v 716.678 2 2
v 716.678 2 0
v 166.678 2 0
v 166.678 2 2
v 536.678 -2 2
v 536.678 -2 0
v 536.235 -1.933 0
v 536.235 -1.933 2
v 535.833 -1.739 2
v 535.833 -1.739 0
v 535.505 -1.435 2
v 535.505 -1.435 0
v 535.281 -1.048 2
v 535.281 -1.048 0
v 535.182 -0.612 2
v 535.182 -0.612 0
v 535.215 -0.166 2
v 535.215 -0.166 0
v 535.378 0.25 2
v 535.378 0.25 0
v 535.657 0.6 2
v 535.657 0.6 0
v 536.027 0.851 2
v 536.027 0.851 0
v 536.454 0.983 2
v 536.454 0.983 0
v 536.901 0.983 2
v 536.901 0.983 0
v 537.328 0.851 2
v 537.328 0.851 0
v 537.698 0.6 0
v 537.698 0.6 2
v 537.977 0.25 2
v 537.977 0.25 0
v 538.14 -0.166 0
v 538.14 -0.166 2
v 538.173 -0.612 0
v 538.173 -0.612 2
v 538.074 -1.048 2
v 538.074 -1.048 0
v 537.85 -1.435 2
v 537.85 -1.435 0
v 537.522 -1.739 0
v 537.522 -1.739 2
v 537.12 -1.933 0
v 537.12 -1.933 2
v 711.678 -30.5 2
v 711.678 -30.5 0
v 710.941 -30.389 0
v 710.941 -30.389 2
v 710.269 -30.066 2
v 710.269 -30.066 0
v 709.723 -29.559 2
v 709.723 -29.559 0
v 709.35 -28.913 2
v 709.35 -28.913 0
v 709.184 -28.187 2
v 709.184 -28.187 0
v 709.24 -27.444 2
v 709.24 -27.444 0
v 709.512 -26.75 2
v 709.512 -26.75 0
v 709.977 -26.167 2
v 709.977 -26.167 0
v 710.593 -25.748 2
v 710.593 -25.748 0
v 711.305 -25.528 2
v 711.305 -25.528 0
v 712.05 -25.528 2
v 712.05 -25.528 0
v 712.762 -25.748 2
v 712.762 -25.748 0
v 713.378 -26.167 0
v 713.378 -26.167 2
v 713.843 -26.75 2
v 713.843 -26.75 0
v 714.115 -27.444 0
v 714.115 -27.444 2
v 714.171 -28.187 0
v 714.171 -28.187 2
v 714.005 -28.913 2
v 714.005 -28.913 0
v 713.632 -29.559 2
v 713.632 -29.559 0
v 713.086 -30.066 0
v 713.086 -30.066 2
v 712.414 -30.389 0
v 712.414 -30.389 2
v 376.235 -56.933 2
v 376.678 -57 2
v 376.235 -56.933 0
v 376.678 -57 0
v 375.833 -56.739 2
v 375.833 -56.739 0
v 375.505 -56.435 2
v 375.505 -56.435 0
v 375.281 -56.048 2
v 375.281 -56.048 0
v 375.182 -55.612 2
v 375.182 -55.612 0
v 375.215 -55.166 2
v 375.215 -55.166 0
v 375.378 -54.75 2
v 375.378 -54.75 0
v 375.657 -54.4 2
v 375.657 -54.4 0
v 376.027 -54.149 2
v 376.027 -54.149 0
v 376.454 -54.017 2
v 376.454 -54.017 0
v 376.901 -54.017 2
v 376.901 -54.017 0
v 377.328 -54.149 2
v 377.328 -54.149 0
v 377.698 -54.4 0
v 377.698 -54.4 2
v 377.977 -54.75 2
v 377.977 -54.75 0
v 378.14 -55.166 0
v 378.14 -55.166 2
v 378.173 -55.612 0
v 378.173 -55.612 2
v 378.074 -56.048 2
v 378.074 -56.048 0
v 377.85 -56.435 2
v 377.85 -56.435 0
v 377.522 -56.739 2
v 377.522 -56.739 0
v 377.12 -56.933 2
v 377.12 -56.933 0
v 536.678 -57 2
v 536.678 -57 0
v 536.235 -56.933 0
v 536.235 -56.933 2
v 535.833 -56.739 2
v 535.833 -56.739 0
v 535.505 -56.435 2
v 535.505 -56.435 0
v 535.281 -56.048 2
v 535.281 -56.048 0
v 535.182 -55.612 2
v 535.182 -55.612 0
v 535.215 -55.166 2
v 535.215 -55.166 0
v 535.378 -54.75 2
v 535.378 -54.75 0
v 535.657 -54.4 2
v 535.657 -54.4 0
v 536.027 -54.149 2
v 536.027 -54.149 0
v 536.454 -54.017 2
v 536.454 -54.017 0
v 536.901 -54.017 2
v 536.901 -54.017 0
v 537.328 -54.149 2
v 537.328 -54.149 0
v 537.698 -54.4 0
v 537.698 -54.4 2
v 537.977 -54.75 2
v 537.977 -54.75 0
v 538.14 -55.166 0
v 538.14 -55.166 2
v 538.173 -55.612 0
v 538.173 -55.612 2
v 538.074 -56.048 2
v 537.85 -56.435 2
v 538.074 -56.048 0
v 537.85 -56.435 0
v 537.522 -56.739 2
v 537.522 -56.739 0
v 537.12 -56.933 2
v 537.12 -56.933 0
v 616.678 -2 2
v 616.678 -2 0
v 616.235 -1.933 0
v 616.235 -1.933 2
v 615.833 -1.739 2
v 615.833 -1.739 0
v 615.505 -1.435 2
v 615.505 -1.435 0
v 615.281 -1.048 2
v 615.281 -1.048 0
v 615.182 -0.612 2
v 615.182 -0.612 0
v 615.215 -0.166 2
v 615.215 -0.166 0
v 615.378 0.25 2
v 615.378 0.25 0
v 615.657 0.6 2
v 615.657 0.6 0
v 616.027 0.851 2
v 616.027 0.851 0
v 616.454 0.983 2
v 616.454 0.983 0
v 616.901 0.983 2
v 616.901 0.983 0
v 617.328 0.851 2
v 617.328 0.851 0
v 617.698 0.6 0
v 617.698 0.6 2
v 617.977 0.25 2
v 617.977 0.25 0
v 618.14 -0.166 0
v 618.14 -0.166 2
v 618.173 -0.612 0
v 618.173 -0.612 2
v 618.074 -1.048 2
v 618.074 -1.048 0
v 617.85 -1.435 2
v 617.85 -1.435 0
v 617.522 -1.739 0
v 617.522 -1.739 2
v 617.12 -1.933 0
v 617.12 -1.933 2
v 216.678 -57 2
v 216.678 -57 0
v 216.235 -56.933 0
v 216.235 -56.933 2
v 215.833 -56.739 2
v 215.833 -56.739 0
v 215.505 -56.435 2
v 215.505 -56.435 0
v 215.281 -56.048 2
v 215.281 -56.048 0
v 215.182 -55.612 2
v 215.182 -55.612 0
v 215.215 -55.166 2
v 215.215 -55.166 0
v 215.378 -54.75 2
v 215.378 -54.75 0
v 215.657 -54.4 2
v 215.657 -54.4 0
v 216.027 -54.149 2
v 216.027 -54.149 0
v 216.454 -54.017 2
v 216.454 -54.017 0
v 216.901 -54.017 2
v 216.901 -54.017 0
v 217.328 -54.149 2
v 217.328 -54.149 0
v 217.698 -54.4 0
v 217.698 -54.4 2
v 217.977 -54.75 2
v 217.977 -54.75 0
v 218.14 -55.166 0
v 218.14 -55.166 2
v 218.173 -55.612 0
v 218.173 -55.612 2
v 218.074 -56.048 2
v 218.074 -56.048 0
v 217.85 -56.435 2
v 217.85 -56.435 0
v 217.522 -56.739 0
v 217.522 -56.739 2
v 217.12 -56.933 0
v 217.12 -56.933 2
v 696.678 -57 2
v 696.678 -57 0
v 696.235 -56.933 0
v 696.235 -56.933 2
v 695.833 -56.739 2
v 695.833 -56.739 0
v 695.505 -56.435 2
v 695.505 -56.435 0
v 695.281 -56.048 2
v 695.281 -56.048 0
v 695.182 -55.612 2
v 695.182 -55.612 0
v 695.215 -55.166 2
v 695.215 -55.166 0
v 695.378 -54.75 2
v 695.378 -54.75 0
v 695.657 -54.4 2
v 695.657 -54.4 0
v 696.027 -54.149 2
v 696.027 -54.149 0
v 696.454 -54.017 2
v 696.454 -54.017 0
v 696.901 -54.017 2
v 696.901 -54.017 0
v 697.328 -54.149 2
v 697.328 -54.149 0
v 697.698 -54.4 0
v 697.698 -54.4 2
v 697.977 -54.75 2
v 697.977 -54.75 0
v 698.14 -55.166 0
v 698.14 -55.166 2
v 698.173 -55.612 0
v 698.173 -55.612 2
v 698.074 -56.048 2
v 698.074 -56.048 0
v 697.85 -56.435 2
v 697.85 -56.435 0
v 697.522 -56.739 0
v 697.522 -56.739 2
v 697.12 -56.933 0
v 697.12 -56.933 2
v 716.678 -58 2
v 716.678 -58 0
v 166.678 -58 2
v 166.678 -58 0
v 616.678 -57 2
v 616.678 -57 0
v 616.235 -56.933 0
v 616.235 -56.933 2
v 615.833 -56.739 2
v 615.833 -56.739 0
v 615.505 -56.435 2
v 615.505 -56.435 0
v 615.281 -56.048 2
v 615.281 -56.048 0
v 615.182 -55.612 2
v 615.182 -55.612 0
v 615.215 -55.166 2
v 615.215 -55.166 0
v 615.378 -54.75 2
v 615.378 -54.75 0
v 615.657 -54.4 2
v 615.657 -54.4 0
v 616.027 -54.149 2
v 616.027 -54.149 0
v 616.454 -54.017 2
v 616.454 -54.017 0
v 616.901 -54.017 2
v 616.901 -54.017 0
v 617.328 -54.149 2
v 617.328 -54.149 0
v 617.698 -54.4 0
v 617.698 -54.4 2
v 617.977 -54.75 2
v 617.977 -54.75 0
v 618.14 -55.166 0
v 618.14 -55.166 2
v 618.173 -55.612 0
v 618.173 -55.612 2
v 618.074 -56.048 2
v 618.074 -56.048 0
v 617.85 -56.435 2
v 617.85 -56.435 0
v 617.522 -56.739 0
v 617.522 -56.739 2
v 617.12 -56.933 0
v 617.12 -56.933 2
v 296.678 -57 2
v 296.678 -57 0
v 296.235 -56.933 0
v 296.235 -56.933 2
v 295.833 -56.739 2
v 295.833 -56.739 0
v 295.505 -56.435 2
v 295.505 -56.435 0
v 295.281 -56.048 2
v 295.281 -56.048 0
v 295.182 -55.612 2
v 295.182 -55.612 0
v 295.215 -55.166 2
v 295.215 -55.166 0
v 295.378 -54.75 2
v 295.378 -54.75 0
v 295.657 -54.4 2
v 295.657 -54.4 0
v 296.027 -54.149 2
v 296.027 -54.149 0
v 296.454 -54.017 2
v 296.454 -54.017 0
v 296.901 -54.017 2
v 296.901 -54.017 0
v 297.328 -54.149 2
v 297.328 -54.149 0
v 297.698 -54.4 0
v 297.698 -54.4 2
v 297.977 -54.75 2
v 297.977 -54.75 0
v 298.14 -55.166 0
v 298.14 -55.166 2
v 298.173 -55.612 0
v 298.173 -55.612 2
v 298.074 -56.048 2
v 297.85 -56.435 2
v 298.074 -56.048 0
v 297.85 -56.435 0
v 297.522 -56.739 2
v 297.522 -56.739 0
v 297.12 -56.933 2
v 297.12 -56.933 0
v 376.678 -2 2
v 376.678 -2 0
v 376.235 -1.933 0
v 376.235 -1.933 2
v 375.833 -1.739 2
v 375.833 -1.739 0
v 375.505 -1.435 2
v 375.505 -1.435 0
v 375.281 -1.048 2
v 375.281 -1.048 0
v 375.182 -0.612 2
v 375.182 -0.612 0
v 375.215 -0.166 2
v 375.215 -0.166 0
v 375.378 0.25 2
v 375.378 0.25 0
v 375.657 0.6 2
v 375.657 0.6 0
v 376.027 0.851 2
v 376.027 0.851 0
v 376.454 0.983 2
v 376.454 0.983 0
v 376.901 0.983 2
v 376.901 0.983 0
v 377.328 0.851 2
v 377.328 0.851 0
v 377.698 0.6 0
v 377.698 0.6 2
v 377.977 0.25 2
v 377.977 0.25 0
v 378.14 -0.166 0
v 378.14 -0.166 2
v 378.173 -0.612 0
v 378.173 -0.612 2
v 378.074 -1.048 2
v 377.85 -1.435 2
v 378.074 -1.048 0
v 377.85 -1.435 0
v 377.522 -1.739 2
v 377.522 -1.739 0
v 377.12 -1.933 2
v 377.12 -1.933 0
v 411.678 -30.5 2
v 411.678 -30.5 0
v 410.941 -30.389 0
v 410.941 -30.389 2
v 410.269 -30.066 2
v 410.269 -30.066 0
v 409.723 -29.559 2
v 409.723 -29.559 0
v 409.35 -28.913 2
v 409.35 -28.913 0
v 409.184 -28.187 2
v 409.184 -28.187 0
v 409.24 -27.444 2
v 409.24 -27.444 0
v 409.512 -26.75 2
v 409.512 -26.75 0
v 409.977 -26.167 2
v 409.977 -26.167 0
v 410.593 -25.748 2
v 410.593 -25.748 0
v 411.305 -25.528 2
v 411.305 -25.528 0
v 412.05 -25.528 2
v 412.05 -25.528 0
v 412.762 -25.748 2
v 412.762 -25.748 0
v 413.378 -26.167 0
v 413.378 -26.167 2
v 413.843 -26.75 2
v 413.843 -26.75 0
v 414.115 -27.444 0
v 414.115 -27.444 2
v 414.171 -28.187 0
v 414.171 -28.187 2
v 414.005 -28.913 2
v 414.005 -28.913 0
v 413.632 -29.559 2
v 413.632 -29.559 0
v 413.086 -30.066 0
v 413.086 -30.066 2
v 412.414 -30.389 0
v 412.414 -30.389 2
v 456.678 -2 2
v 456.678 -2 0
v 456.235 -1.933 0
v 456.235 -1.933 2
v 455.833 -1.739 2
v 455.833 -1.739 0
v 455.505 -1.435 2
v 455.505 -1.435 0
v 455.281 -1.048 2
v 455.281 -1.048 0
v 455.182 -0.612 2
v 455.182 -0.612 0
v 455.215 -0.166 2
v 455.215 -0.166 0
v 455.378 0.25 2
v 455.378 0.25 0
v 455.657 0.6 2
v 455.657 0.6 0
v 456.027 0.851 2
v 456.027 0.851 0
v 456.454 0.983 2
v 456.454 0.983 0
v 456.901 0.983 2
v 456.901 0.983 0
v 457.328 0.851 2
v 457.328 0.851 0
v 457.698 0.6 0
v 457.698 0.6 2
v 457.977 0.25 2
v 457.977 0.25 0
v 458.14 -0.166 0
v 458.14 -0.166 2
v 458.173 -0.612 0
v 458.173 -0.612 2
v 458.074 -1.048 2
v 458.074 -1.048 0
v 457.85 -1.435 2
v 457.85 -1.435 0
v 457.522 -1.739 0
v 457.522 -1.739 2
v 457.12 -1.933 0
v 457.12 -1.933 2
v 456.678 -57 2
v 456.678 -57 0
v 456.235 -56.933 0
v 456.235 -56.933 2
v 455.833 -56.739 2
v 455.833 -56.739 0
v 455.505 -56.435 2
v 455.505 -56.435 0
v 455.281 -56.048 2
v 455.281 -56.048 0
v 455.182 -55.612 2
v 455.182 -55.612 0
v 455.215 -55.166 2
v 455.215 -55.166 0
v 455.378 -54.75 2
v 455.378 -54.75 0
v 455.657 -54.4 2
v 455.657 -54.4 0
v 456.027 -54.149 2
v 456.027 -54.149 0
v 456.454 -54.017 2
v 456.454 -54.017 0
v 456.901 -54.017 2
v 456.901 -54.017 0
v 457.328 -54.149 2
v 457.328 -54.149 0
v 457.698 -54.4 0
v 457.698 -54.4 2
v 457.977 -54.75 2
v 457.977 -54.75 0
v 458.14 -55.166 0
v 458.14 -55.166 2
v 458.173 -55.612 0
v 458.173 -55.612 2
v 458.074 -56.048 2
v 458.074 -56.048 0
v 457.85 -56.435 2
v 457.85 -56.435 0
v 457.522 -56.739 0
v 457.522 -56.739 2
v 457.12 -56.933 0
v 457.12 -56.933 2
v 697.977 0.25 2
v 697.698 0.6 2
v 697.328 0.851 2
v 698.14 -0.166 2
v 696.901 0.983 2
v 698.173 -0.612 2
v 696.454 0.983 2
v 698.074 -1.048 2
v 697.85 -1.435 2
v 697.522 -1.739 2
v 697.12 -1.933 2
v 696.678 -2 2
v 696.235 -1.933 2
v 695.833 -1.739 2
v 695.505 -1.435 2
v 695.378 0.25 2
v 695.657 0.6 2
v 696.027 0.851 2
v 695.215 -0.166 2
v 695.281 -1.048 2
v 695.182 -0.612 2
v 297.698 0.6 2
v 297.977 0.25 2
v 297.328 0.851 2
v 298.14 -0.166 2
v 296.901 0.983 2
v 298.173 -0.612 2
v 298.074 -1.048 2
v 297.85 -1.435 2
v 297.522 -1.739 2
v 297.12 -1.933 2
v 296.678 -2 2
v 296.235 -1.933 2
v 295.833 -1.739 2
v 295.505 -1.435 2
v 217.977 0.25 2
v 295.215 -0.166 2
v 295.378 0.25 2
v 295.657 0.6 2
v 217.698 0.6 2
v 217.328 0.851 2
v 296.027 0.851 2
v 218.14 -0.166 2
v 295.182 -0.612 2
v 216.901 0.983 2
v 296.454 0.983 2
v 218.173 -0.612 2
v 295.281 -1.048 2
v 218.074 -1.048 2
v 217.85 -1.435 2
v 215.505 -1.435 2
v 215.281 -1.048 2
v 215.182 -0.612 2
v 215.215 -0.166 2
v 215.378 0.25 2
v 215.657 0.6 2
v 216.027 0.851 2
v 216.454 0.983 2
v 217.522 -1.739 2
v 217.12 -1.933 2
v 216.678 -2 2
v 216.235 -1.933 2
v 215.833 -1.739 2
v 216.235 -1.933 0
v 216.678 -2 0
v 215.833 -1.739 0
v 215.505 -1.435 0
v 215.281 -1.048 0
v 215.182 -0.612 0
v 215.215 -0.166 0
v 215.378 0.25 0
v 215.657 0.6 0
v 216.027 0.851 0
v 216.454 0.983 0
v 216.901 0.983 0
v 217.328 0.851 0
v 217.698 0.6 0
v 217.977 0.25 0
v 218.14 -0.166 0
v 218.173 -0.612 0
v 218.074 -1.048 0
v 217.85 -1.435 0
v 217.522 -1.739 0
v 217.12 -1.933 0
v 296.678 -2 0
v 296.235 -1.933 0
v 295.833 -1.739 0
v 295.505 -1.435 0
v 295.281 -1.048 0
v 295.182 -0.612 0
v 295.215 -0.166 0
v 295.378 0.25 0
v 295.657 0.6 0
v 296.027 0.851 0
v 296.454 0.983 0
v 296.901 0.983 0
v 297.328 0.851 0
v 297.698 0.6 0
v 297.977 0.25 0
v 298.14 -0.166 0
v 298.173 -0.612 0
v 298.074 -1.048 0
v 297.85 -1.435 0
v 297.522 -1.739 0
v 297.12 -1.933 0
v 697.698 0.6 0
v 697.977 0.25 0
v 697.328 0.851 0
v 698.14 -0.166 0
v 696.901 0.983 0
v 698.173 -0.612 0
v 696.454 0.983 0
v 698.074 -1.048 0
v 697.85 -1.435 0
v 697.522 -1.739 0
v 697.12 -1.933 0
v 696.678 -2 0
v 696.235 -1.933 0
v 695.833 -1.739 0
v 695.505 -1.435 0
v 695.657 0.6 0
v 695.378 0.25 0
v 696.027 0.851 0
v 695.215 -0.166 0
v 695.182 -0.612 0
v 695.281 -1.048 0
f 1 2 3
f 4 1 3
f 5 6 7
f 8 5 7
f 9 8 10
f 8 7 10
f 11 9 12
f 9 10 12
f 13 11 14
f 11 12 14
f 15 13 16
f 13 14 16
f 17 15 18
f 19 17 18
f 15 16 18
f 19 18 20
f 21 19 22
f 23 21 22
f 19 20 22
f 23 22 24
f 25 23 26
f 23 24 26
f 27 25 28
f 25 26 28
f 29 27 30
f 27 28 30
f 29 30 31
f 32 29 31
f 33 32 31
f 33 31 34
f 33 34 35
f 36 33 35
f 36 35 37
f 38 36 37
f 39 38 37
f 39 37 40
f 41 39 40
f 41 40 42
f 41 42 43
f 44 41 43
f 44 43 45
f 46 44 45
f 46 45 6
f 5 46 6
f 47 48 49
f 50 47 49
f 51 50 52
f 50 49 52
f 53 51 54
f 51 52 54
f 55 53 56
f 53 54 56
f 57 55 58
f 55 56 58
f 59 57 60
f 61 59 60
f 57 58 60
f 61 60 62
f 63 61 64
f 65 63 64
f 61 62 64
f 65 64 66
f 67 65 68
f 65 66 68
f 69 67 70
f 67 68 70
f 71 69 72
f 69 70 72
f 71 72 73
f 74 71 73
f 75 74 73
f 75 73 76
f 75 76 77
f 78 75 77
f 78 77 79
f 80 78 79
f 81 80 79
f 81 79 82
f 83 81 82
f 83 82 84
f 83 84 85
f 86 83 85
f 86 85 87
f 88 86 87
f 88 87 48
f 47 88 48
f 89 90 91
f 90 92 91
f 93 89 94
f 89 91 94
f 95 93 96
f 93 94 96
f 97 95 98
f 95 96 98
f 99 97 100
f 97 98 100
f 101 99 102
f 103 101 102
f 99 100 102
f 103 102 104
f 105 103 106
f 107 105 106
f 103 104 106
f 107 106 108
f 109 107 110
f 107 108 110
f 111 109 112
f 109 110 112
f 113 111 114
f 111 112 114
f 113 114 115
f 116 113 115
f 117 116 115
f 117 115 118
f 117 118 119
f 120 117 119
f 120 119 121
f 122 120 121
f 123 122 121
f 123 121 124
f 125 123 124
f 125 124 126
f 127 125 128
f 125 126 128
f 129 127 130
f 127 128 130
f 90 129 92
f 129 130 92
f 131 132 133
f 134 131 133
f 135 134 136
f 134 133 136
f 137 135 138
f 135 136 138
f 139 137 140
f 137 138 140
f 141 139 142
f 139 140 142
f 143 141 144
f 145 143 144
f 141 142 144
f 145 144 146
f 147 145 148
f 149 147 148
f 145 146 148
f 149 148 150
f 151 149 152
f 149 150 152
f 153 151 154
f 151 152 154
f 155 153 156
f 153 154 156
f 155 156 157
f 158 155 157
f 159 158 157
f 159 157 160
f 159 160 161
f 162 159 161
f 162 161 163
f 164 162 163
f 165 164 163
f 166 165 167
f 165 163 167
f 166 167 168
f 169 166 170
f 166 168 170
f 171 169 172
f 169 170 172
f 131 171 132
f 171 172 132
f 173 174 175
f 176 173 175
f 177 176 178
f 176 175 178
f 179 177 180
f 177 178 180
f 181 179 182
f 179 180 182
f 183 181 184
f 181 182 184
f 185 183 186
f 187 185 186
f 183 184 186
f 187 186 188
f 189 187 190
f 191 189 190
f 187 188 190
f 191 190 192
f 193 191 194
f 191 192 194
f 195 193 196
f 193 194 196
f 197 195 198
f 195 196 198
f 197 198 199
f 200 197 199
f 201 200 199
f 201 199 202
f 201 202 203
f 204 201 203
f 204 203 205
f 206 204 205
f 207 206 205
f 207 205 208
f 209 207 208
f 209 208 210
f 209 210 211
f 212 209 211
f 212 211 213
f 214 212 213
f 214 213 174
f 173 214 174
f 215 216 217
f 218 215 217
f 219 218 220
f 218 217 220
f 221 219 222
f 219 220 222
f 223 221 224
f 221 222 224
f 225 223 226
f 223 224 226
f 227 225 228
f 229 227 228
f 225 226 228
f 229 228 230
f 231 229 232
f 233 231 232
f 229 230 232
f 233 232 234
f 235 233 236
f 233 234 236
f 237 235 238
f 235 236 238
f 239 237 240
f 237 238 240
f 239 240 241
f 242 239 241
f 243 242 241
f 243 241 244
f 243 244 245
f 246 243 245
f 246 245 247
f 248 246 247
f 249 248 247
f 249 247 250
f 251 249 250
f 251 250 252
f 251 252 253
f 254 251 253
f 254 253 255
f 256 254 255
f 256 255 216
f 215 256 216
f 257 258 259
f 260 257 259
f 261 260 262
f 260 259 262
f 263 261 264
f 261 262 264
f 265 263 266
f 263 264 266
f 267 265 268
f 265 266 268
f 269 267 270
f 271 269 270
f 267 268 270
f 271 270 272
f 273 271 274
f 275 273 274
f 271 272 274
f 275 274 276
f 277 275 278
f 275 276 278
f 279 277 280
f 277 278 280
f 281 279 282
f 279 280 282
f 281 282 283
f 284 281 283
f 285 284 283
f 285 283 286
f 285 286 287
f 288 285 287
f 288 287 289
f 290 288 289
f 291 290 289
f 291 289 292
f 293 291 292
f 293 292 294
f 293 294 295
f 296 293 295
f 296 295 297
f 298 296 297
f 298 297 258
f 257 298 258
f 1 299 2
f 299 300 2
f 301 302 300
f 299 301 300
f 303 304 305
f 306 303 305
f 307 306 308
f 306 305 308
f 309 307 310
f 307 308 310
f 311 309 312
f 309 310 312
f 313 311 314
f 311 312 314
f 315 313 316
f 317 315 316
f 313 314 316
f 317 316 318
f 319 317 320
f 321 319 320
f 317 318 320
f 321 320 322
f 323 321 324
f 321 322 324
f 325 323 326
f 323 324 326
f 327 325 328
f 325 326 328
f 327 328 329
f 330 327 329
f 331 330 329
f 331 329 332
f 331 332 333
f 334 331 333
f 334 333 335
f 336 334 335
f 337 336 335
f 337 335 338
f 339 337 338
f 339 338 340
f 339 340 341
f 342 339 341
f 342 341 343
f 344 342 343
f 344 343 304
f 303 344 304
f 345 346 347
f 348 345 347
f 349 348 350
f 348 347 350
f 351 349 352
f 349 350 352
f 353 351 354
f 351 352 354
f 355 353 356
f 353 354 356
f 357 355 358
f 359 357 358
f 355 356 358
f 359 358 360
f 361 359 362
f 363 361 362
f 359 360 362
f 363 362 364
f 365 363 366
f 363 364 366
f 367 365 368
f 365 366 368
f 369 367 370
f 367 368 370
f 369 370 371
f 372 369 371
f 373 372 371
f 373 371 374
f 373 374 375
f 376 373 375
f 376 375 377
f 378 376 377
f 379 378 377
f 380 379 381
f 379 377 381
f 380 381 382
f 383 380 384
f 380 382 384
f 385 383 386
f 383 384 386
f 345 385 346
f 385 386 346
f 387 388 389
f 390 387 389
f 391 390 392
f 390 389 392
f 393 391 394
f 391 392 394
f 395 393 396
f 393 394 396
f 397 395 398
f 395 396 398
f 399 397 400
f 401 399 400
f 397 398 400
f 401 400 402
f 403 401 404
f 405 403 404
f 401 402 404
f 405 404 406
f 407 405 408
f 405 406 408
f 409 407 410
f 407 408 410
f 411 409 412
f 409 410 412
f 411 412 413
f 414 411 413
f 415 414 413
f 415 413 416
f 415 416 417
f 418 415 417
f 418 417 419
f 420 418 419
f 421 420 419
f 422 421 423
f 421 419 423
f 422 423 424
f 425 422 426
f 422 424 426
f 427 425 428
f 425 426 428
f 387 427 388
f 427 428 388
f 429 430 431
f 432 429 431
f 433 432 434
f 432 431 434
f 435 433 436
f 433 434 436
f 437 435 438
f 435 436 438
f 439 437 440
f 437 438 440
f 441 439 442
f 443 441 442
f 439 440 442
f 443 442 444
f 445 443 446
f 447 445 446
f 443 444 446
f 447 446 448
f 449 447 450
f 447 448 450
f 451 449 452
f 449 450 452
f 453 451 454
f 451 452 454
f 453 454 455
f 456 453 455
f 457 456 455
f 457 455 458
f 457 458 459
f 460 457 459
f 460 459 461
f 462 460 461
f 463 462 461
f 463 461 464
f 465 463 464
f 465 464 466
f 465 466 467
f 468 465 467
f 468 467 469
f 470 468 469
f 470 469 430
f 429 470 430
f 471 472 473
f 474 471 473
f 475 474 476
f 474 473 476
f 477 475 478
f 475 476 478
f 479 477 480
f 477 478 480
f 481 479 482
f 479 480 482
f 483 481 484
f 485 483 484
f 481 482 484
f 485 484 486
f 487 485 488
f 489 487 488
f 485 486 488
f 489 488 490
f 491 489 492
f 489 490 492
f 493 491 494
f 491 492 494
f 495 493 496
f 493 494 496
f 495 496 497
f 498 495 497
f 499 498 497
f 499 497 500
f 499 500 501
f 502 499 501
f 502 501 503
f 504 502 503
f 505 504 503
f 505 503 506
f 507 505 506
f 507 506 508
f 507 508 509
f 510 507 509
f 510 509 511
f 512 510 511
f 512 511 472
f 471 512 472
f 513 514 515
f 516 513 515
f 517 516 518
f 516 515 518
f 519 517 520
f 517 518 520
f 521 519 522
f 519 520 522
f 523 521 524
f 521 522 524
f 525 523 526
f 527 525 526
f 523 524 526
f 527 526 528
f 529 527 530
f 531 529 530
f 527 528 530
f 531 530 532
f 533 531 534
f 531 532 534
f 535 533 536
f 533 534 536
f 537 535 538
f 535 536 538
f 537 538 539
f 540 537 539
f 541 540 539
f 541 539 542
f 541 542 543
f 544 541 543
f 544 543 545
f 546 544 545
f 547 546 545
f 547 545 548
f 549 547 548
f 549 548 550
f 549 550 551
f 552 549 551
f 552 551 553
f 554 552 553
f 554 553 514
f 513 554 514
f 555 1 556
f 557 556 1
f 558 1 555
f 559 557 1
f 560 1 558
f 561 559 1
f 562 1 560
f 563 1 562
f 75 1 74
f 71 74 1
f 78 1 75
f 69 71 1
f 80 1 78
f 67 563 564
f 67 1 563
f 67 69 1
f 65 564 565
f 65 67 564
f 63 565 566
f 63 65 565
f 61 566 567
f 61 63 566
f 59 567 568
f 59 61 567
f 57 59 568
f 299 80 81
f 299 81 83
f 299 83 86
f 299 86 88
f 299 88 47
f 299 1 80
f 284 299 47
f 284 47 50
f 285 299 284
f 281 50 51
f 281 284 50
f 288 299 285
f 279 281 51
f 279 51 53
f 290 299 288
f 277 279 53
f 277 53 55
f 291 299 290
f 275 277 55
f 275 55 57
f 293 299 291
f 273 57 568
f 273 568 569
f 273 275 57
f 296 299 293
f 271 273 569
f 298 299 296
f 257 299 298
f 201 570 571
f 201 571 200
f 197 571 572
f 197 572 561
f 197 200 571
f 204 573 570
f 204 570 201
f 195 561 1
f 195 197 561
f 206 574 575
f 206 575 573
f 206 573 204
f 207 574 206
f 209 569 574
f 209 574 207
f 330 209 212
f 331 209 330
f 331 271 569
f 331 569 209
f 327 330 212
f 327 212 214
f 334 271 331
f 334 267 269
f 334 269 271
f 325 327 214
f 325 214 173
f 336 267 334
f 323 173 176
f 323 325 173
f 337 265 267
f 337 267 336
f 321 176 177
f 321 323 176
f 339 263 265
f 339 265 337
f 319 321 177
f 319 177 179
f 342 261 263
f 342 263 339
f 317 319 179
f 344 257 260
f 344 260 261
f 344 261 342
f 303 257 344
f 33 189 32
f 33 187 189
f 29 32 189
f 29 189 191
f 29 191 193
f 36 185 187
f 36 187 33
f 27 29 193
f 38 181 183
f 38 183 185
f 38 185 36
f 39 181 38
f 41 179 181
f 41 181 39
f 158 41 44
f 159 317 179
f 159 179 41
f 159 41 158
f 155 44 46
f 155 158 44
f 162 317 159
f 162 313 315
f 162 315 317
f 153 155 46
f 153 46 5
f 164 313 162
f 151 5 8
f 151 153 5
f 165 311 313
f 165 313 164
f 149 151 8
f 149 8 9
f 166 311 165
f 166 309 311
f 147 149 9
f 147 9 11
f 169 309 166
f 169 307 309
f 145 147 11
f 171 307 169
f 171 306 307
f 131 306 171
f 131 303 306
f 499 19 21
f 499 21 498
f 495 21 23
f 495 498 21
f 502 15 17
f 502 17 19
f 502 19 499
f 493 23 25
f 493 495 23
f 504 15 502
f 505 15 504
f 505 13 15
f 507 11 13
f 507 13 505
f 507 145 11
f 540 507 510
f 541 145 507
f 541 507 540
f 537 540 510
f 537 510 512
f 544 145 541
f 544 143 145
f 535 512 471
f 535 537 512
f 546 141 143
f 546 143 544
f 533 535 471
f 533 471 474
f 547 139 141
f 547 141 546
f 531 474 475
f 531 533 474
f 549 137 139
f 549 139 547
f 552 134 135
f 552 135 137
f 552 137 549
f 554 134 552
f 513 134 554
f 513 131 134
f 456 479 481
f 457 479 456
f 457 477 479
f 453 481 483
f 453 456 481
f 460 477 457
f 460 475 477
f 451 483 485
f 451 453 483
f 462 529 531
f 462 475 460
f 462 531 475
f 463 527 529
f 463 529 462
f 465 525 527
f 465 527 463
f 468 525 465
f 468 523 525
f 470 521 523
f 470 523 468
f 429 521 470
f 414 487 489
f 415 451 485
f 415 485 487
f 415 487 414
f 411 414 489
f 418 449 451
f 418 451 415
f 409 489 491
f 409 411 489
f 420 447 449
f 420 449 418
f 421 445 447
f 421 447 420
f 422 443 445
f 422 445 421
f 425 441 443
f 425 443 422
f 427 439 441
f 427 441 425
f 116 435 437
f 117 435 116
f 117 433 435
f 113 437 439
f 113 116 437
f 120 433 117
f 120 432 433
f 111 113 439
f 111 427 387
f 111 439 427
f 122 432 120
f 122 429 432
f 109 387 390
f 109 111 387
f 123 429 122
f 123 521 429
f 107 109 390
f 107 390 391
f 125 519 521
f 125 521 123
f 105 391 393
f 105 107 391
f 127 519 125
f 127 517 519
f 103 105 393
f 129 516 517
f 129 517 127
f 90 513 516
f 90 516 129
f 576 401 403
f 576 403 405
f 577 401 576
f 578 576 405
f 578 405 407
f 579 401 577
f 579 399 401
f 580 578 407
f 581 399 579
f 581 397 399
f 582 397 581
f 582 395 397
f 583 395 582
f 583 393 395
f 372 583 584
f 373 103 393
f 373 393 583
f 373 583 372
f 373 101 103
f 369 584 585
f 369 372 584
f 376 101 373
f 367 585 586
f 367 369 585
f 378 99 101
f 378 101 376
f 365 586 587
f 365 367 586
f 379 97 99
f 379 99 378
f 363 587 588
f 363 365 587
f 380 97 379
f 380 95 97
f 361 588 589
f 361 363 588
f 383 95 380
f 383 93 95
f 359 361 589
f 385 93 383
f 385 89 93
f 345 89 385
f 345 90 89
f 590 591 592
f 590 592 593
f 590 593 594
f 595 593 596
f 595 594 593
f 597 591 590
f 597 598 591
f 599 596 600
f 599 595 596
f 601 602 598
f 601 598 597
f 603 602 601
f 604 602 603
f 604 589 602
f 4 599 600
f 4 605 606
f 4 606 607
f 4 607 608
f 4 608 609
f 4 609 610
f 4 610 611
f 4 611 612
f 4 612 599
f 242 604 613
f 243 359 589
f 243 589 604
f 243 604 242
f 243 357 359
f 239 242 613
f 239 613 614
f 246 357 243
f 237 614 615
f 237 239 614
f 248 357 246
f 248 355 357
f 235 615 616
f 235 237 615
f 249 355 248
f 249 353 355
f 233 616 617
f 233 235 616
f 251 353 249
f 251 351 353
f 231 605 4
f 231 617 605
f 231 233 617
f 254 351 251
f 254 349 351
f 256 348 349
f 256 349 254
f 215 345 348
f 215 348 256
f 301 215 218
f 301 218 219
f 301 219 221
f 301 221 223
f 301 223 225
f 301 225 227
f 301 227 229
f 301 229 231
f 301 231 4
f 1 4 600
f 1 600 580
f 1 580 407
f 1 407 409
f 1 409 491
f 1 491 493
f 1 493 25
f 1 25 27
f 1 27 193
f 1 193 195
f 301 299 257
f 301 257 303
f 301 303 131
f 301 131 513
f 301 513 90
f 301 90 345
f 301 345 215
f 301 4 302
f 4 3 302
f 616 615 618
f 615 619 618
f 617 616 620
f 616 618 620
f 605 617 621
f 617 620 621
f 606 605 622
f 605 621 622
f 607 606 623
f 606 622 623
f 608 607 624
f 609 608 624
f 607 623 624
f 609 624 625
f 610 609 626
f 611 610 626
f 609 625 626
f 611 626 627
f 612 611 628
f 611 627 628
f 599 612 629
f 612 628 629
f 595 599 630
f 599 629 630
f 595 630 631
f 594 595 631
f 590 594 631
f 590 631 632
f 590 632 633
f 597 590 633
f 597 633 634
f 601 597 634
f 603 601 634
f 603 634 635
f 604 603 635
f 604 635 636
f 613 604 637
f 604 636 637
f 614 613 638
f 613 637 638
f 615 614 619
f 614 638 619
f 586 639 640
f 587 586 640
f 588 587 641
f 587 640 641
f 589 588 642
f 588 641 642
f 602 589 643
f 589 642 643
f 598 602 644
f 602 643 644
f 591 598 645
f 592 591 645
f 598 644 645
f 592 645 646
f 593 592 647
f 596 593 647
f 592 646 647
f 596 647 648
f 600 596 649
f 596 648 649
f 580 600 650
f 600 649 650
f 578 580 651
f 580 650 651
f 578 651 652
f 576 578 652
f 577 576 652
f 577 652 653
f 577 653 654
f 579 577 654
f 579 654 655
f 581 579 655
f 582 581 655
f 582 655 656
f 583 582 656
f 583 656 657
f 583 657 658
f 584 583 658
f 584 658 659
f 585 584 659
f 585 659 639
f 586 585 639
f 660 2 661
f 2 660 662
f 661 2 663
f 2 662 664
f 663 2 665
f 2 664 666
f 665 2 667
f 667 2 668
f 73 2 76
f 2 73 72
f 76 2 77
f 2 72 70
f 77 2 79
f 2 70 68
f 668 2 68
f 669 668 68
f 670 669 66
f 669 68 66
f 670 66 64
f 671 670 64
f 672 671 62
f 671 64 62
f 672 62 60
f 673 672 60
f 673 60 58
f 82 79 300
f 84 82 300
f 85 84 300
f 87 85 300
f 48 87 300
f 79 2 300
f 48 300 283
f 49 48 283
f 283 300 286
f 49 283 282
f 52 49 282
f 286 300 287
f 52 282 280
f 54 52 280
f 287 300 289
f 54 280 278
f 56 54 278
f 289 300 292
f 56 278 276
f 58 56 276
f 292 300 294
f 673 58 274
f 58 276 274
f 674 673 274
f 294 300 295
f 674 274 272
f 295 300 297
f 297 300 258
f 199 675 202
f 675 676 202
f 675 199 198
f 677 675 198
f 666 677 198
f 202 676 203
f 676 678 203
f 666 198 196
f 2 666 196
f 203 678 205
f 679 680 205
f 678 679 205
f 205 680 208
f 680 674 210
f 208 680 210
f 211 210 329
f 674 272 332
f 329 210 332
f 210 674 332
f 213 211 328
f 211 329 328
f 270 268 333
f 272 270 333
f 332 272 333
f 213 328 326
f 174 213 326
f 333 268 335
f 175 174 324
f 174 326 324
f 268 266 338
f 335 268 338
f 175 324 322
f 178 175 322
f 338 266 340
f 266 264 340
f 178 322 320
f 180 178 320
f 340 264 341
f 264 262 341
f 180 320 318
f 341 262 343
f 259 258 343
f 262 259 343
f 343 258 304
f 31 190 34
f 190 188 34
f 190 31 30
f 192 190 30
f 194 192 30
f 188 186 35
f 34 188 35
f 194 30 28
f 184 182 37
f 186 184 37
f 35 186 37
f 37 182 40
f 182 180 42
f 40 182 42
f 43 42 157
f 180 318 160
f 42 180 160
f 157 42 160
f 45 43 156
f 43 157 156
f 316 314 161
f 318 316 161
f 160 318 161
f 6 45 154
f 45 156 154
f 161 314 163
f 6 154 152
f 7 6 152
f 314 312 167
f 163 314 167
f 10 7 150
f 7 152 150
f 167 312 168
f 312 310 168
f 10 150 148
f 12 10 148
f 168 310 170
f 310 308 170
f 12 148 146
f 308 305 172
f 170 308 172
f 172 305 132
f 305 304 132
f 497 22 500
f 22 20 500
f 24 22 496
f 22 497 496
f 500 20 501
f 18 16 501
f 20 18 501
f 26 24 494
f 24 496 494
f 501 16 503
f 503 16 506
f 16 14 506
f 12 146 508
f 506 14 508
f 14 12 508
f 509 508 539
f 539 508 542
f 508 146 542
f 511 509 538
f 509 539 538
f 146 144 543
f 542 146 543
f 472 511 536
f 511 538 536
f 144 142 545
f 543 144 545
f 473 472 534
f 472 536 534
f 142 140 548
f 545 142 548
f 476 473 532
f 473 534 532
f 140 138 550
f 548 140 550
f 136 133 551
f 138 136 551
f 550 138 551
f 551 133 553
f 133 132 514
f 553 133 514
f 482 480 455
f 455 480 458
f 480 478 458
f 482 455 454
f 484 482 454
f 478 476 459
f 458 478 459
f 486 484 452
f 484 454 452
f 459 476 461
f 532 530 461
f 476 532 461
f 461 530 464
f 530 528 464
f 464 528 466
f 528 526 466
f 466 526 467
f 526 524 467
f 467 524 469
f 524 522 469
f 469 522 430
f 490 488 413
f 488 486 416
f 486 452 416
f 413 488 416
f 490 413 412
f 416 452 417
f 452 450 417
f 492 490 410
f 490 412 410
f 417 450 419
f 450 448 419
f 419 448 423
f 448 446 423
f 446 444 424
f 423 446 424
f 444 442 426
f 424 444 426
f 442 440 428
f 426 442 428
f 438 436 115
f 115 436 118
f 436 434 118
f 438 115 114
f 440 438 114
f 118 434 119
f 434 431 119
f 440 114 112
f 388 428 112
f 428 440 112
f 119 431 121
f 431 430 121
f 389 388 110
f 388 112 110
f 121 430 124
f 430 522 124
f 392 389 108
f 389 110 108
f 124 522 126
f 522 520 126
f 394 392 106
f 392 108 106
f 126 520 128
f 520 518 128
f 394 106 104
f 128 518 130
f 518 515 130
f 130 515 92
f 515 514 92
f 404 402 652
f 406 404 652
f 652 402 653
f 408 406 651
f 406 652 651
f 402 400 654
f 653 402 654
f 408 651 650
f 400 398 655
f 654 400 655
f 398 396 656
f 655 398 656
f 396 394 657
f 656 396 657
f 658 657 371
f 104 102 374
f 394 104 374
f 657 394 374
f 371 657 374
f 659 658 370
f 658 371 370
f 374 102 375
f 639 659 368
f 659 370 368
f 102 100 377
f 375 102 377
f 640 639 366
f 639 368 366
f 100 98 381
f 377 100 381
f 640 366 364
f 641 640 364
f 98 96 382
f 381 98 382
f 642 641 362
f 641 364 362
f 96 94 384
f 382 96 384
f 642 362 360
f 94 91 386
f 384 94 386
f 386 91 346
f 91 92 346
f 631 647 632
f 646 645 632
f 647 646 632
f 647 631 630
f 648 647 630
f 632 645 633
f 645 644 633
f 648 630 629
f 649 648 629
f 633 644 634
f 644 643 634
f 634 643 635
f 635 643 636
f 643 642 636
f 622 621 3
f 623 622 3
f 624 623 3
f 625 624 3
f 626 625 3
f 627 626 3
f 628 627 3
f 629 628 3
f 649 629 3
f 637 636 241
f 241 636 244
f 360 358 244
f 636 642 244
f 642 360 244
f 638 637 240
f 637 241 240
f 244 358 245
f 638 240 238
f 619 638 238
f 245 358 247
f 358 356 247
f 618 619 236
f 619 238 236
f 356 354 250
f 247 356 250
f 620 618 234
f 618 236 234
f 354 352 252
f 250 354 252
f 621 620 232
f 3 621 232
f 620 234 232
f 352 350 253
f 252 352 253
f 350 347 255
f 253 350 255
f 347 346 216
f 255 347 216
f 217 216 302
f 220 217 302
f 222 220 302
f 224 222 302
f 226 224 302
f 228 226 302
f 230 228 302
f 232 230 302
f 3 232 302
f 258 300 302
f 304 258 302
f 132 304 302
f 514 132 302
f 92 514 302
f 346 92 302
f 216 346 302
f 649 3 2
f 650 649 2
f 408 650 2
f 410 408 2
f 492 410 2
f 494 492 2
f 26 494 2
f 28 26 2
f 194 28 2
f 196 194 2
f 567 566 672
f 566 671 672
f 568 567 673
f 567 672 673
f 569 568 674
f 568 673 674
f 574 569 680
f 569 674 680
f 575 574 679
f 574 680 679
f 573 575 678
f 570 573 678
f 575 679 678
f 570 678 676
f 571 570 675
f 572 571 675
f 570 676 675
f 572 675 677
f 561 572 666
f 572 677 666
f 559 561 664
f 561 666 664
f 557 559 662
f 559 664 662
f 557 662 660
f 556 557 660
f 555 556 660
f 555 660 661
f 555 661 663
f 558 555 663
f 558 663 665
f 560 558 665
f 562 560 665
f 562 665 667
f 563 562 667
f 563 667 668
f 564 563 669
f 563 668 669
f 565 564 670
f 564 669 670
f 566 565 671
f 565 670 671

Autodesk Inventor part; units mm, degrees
ref_plane "YZ Plane" through (0, 0, 0) normal (1, 0, 0) x (0, 1, 0)
ref_plane "XZ Plane" through (0, 0, 0) normal (0, 1, 0) x (-1, 0, 0)
ref_plane "XY Plane" through (0, 0, 0) normal (0, 0, 1) x (1, 0, 0)
ref_plane "Work Plane3" through (759.785, -2, 0) normal (0, 0, 1) x (-1, 0, 0)
sketch "Sketch2" plane through (759.785, -2, 0) normal (0, 0, 1) x (-1, 0, 0)
  line L0 (43.1075, -4) -> (593.1075, -4)
  line L1 (593.1075, -4) -> (593.1075, 56)
  line L2 (593.1075, 56) -> (43.1075, 56)
  line L3 (43.1075, 56) -> (43.1075, -4)
  point P0 (759.785, -2)
  dimension "d0" = 550
  dimension "d1" = 60
extrude "Extrusion1" add sketch "Sketch2" along normal blind 2
sketch "Sketch4" plane through (759.785, -2, 2) normal (0, 0, 1) x (1, 0, 0)
  line L0 (-43.1075, 4) -> (-593.1075, 4) projected
  line L1 (-43.1075, -56) -> (-43.1075, 4) projected
  point P0 (-759.785, 2)
  point P1 (-48.1075, -26)
  point P2 (-348.1075, -26)
  point P3 (-648.1075, -26)
  dimension "d14" = 30
  dimension "d15" = 5
  dimension "d18" = 300
hole "Hole2" at (111.6775, -28, 2) at (411.6775, -28, 2) at (711.6775, -28, 2) direction (0, 0, -1) diameter 5 end through all
chamfer "Chamfer1" [suppressed]
sketch "Sketch5" plane through (759.785, -2, 2) normal (0, 0, 1) x (1, 0, 0)
  line L0 (-43.1075, 4) -> (-593.1075, 4) projected
  line L1 (-43.1075, -56) -> (-43.1075, 4) projected
  point P0 (-63.1075, 1.5)
  point P1 (-143.1075, 1.5)
  point P2 (-223.1075, 1.5)
  point P3 (-303.1075, 1.5)
  point P4 (-383.1075, 1.5)
  point P5 (-463.1075, 1.5)
  point P6 (-543.1075, 1.5)
  point P7 (-63.1075, -53.5)
  point P8 (-143.1075, -53.5)
  point P9 (-223.1075, -53.5)
  point P10 (-303.1075, -53.5)
  point P11 (-383.1075, -53.5)
  point P12 (-463.1075, -53.5)
  point P13 (-543.1075, -53.5)
  dimension "d30" = 2.5
  dimension "d31" = 20
  dimension "d34" = 80
  dimension "d37" = 55
hole "Hole3" at (536.6775, -55.5, 2) at (536.6775, -0.5, 2) at (456.6775, -0.5, 2) at (376.6775, -55.5, 2) at (376.6775, -0.5, 2) at (296.6775, -55.5, 2) at (296.6775, -0.5, 2) at (216.6775, -55.5, 2) at (216.6775, -0.5, 2) at (456.6775, -55.5, 2) at (696.6775, -55.5, 2) at (696.6775, -0.5, 2) at (616.6775, -55.5, 2) at (616.6775, -0.5, 2) direction (0, 0, -1) diameter 3 end through all
sketch "Sketch6" plane through (759.785, -2, 2) normal (0, 0, 1) x (1, 0, 0)
  line L0 (-415.5028, -23.6333) -> (-415.0497, -23.6333)
  line L1 (-415.0497, -23.6333) -> (-415.0497, -27.7161)
  line L2 (-415.0497, -27.7161) -> (-409.6296, -27.7161)
  line L3 (-409.6296, -27.7161) -> (-409.6296, -23.6333)
  line L4 (-409.6296, -23.6333) -> (-409.1821, -23.6333)
  line L5 (-409.1821, -23.6333) -> (-409.1821, -31.8699)
  line L6 (-409.1821, -31.8699) -> (-409.6296, -31.8699)
  line L7 (-409.6296, -31.8699) -> (-409.6296, -28.1582)
  line L8 (-409.6296, -28.1582) -> (-415.0497, -28.1582)
  line L9 (-415.0497, -28.1582) -> (-415.0497, -31.8699)
  line L10 (-415.0497, -31.8699) -> (-415.5028, -31.8699)
  line L11 (-415.5028, -31.8699) -> (-415.5028, -23.6333)
  line L12 (-423.5865, -23.5569) -> (-418.1391, -23.5569)
  line L13 (-418.1391, -23.5569) -> (-418.1391, -31.9518)
  line L14 (-418.1391, -31.9518) -> (-423.5865, -31.9518)
  line L15 (-423.5865, -31.9518) -> (-423.5865, -31.5151)
  line L16 (-423.5865, -31.5151) -> (-418.5867, -31.5151)
  line L17 (-418.5867, -31.5151) -> (-418.5867, -28.1582)
  line L18 (-418.5867, -28.1582) -> (-421.6324, -28.1582)
  line L19 (-421.6324, -28.1582) -> (-421.6324, -27.7161)
  line L20 (-421.6324, -27.7161) -> (-418.5867, -27.7161)
  line L21 (-418.5867, -27.7161) -> (-418.5867, -23.9827)
  line L22 (-418.5867, -23.9827) -> (-423.5865, -23.9827)
  line L23 (-423.5865, -23.9827) -> (-423.5865, -23.5569)
  line L24 (-431.5121, -23.7589) -> (-431.1136, -23.5624)
  line L25 (-431.1136, -23.5624) -> (-428.4991, -27.3504)
  line L26 (-428.4991, -27.3504) -> (-425.8791, -23.5569)
  line L27 (-425.8791, -23.5569) -> (-425.4861, -23.7589)
  line L28 (-425.4861, -23.7589) -> (-428.2207, -27.7434)
  line L29 (-428.2207, -27.7434) -> (-425.4916, -31.728)
  line L30 (-425.4916, -31.728) -> (-425.8791, -31.9572)
  line L31 (-425.8791, -31.9572) -> (-428.4991, -28.1474)
  line L32 (-428.4991, -28.1474) -> (-431.1136, -31.9572)
  line L33 (-431.1136, -31.9572) -> (-431.5121, -31.7335)
  line L34 (-431.5121, -31.7335) -> (-428.772, -27.7434)
  line L35 (-428.772, -27.7434) -> (-431.5121, -23.7589)
  line L36 (-440.0543, -23.7206) -> (-439.6504, -23.5733)
  line L37 (-439.6504, -23.5733) -> (-438.6023, -26.2041)
  line L38 (-438.6023, -26.2041) -> (-434.7434, -26.2041)
  line L39 (-434.7434, -26.2041) -> (-433.6953, -23.5733)
  line L40 (-433.6953, -23.5733) -> (-433.2914, -23.7206)
  line L41 (-433.2914, -23.7206) -> (-436.5228, -31.9518)
  line L42 (-436.5228, -31.9518) -> (-436.8284, -31.9518)
  line L43 (-436.8284, -31.9518) -> (-440.0543, -23.7206)
  line L44 (-438.4332, -26.6408) -> (-436.6756, -31.1221)
  line L45 (-436.6756, -31.1221) -> (-434.9125, -26.6408)
  line L46 (-434.9125, -26.6408) -> (-438.4332, -26.6408)
  line L47 (-448.2091, -23.6333) -> (-447.756, -23.6333)
  line L48 (-447.756, -23.6333) -> (-447.756, -27.7161)
  line L49 (-447.756, -27.7161) -> (-442.3359, -27.7161)
  line L50 (-442.3359, -27.7161) -> (-442.3359, -23.6333)
  line L51 (-442.3359, -23.6333) -> (-441.8884, -23.6333)
  line L52 (-441.8884, -23.6333) -> (-441.8884, -31.8699)
  line L53 (-441.8884, -31.8699) -> (-442.3359, -31.8699)
  line L54 (-442.3359, -31.8699) -> (-442.3359, -28.1582)
  line L55 (-442.3359, -28.1582) -> (-447.756, -28.1582)
  line L56 (-447.756, -28.1582) -> (-447.756, -31.8699)
  line L57 (-447.756, -31.8699) -> (-448.2091, -31.8699)
  line L58 (-448.2091, -31.8699) -> (-448.2091, -23.6333)
  line L59 (-457.5864, -31.6952) -> (-454.426, -27.8581)
  line L60 (-454.426, -27.8581) -> (-454.426, -23.6333)
  line L61 (-454.426, -23.6333) -> (-453.9729, -23.6333)
  line L62 (-453.9729, -23.6333) -> (-453.9729, -27.8581)
  line L63 (-453.9729, -27.8581) -> (-450.8181, -31.6952)
  line L64 (-450.8181, -31.6952) -> (-451.1566, -31.9791)
  line L65 (-451.1566, -31.9791) -> (-454.2023, -28.2893)
  line L66 (-454.2023, -28.2893) -> (-457.248, -31.9791)
  line L67 (-457.248, -31.9791) -> (-457.5864, -31.6952)
  line L68 (-464.5622, -26.7663) -> (-464.1473, -25.582)
  line L69 (-464.1473, -25.582) -> (-463.7489, -24.7686)
  line L70 (-463.7489, -24.7686) -> (-462.8865, -23.9499)
  line L71 (-462.8865, -23.9499) -> (-461.631, -23.5569)
  line L72 (-461.631, -23.5569) -> (-458.6344, -23.5569)
  line L73 (-458.6344, -23.5569) -> (-458.6344, -31.9518)
  line L74 (-458.6344, -31.9518) -> (-461.631, -31.9518)
  line L75 (-461.631, -31.9518) -> (-462.8865, -31.5425)
  line L76 (-462.8865, -31.5425) -> (-463.7489, -30.7291)
  line L77 (-463.7489, -30.7291) -> (-464.1473, -29.9158)
  line L78 (-464.1473, -29.9158) -> (-464.5622, -28.726)
  line L79 (-464.5622, -28.726) -> (-464.5622, -26.7663)
  line L80 (-464.1091, -26.832) -> (-464.1091, -28.6659)
  line L81 (-464.1091, -28.6659) -> (-463.7435, -29.7521)
  line L82 (-463.7435, -29.7521) -> (-463.3668, -30.4617)
  line L83 (-463.3668, -30.4617) -> (-462.6517, -31.1658)
  line L84 (-462.6517, -31.1658) -> (-461.5655, -31.5151)
  line L85 (-461.5655, -31.5151) -> (-459.082, -31.5151)
  line L86 (-459.082, -31.5151) -> (-459.082, -23.9827)
  line L87 (-459.082, -23.9827) -> (-461.5655, -23.9827)
  line L88 (-461.5655, -23.9827) -> (-462.6517, -24.3321)
  line L89 (-462.6517, -24.3321) -> (-463.3668, -25.0361)
  line L90 (-463.3668, -25.0361) -> (-463.7435, -25.7456)
  line L91 (-463.7435, -25.7456) -> (-464.1091, -26.832)
  line L92 (-472.7388, -29.4028) -> (-472.3075, -28.5622)
  line L93 (-472.3075, -28.5622) -> (-471.8436, -28.1256)
  line L94 (-471.8436, -28.1256) -> (-470.5882, -27.7161)
  line L95 (-470.5882, -27.7161) -> (-470.1952, -27.7161)
  line L96 (-470.1952, -27.7161) -> (-472.7878, -23.7589)
  line L97 (-472.7878, -23.7589) -> (-472.384, -23.5569)
  line L98 (-472.384, -23.5569) -> (-469.6548, -27.7161)
  line L99 (-469.6548, -27.7161) -> (-467.2586, -27.7161)
  line L100 (-467.2586, -27.7161) -> (-467.2586, -23.6333)
  line L101 (-467.2586, -23.6333) -> (-466.811, -23.6333)
  line L102 (-466.811, -23.6333) -> (-466.811, -31.9518)
  line L103 (-466.811, -31.9518) -> (-470.5882, -31.9518)
  line L104 (-470.5882, -31.9518) -> (-471.8436, -31.5425)
  line L105 (-471.8436, -31.5425) -> (-472.3075, -31.1112)
  line L106 (-472.3075, -31.1112) -> (-472.7388, -30.2652)
  line L107 (-472.7388, -30.2652) -> (-472.7388, -29.4028)
  line L108 (-472.2857, -29.512) -> (-472.2857, -30.1615)
  line L109 (-472.2857, -30.1615) -> (-471.9309, -30.8437)
  line L110 (-471.9309, -30.8437) -> (-471.6089, -31.1658)
  line L111 (-471.6089, -31.1658) -> (-470.5228, -31.5151)
  line L112 (-470.5228, -31.5151) -> (-467.2586, -31.5151)
  line L113 (-467.2586, -31.5151) -> (-467.2586, -28.1582)
  line L114 (-467.2586, -28.1582) -> (-470.5228, -28.1582)
  line L115 (-470.5228, -28.1582) -> (-471.6089, -28.5076)
  line L116 (-471.6089, -28.5076) -> (-471.9309, -28.8297)
  line L117 (-471.9309, -28.8297) -> (-472.2857, -29.512)
  line L118 (-481.3082, -26.7663) -> (-480.8934, -25.582)
  line L119 (-480.8934, -25.582) -> (-480.4895, -24.7686)
  line L120 (-480.4895, -24.7686) -> (-479.6544, -23.9609)
  line L121 (-479.6544, -23.9609) -> (-478.7865, -23.5569)
  line L122 (-478.7865, -23.5569) -> (-477.1107, -23.5569)
  line L123 (-477.1107, -23.5569) -> (-476.2484, -23.9609)
  line L124 (-476.2484, -23.9609) -> (-475.4079, -24.7686)
  line L125 (-475.4079, -24.7686) -> (-475.0093, -25.582)
  line L126 (-475.0093, -25.582) -> (-474.5946, -26.7663)
  line L127 (-474.5946, -26.7663) -> (-474.5946, -28.726)
  line L128 (-474.5946, -28.726) -> (-475.0093, -29.9158)
  line L129 (-475.0093, -29.9158) -> (-475.4079, -30.7291)
  line L130 (-475.4079, -30.7291) -> (-476.2484, -31.537)
  line L131 (-476.2484, -31.537) -> (-477.1107, -31.9518)
  line L132 (-477.1107, -31.9518) -> (-478.7865, -31.9518)
  line L133 (-478.7865, -31.9518) -> (-479.6544, -31.537)
  line L134 (-479.6544, -31.537) -> (-480.4895, -30.7291)
  line L135 (-480.4895, -30.7291) -> (-480.8934, -29.9158)
  line L136 (-480.8934, -29.9158) -> (-481.3082, -28.726)
  line L137 (-481.3082, -28.726) -> (-481.3082, -26.7663)
  line L138 (-480.8552, -26.832) -> (-480.8552, -28.6659)
  line L139 (-480.8552, -28.6659) -> (-480.484, -29.7521)
  line L140 (-480.484, -29.7521) -> (-480.1129, -30.4617)
  line L141 (-480.1129, -30.4617) -> (-479.376, -31.1713)
  line L142 (-479.376, -31.1713) -> (-478.6774, -31.5151)
  line L143 (-478.6774, -31.5151) -> (-477.2254, -31.5151)
  line L144 (-477.2254, -31.5151) -> (-476.5213, -31.1713)
  line L145 (-476.5213, -31.1713) -> (-475.7899, -30.4617)
  line L146 (-475.7899, -30.4617) -> (-475.4133, -29.7521)
  line L147 (-475.4133, -29.7521) -> (-475.0475, -28.6659)
  line L148 (-475.0475, -28.6659) -> (-475.0475, -26.832)
  line L149 (-475.0475, -26.832) -> (-475.4133, -25.7456)
  line L150 (-475.4133, -25.7456) -> (-475.7899, -25.0361)
  line L151 (-475.7899, -25.0361) -> (-476.5213, -24.3265)
  line L152 (-476.5213, -24.3265) -> (-477.2254, -23.9827)
  line L153 (-477.2254, -23.9827) -> (-478.6774, -23.9827)
  line L154 (-478.6774, -23.9827) -> (-479.376, -24.3265)
  line L155 (-479.376, -24.3265) -> (-480.1129, -25.0361)
  line L156 (-480.1129, -25.0361) -> (-480.484, -25.7456)
  line L157 (-480.484, -25.7456) -> (-480.8552, -26.832)
  line L158 (-489.3976, -31.5151) -> (-486.7449, -31.5151)
  line L159 (-486.7449, -31.5151) -> (-486.7449, -23.6333)
  line L160 (-486.7449, -23.6333) -> (-486.2918, -23.6333)
  line L161 (-486.2918, -23.6333) -> (-486.2918, -31.5151)
  line L162 (-486.2918, -31.5151) -> (-483.6445, -31.5151)
  line L163 (-483.6445, -31.5151) -> (-483.6445, -31.9518)
  line L164 (-483.6445, -31.9518) -> (-489.3976, -31.9518)
  line L165 (-489.3976, -31.9518) -> (-489.3976, -31.5151)
  line L166 (-496.8809, -23.6333) -> (-496.4278, -23.6333)
  line L167 (-496.4278, -23.6333) -> (-496.4278, -27.7161)
  line L168 (-496.4278, -27.7161) -> (-491.0077, -27.7161)
  line L169 (-491.0077, -27.7161) -> (-491.0077, -23.6333)
  line L170 (-491.0077, -23.6333) -> (-490.5601, -23.6333)
  line L171 (-490.5601, -23.6333) -> (-490.5601, -31.8699)
  line L172 (-490.5601, -31.8699) -> (-491.0077, -31.8699)
  line L173 (-491.0077, -31.8699) -> (-491.0077, -28.1582)
  line L174 (-491.0077, -28.1582) -> (-496.4278, -28.1582)
  line L175 (-496.4278, -28.1582) -> (-496.4278, -31.8699)
  line L176 (-496.4278, -31.8699) -> (-496.8809, -31.8699)
  line L177 (-496.8809, -31.8699) -> (-496.8809, -23.6333)
  line L178 (-506.2582, -31.6952) -> (-503.0978, -27.8581)
  line L179 (-503.0978, -27.8581) -> (-503.0978, -23.6333)
  line L180 (-503.0978, -23.6333) -> (-502.6449, -23.6333)
  line L181 (-502.6449, -23.6333) -> (-502.6449, -27.8581)
  line L182 (-502.6449, -27.8581) -> (-499.4899, -31.6952)
  line L183 (-499.4899, -31.6952) -> (-499.8283, -31.9791)
  line L184 (-499.8283, -31.9791) -> (-502.8741, -28.2893)
  line L185 (-502.8741, -28.2893) -> (-505.9198, -31.9791)
  line L186 (-505.9198, -31.9791) -> (-506.2582, -31.6952)
  line L187 (-514.0147, -23.6333) -> (-513.567, -23.6333)
  line L188 (-513.567, -23.6333) -> (-513.567, -30.549)
  line L189 (-513.567, -30.549) -> (-510.8489, -23.6333)
  line L190 (-510.8489, -23.6333) -> (-510.4777, -23.6333)
  line L191 (-510.4777, -23.6333) -> (-507.754, -30.549)
  line L192 (-507.754, -30.549) -> (-507.754, -23.6333)
  line L193 (-507.754, -23.6333) -> (-507.3063, -23.6333)
  line L194 (-507.3063, -23.6333) -> (-507.3063, -31.9518)
  line L195 (-507.3063, -31.9518) -> (-507.6831, -31.9518)
  line L196 (-507.6831, -31.9518) -> (-510.6633, -24.3701)
  line L197 (-510.6633, -24.3701) -> (-513.6381, -31.9518)
  line L198 (-513.6381, -31.9518) -> (-514.0147, -31.9518)
  line L199 (-514.0147, -31.9518) -> (-514.0147, -23.6333)
  line L200 (-522.9772, -26.7663) -> (-522.5624, -25.582)
  line L201 (-522.5624, -25.582) -> (-522.1585, -24.7686)
  line L202 (-522.1585, -24.7686) -> (-521.3234, -23.9609)
  line L203 (-521.3234, -23.9609) -> (-520.4555, -23.5569)
  line L204 (-520.4555, -23.5569) -> (-518.7797, -23.5569)
  line L205 (-518.7797, -23.5569) -> (-517.9173, -23.9609)
  line L206 (-517.9173, -23.9609) -> (-517.0768, -24.7686)
  line L207 (-517.0768, -24.7686) -> (-516.6782, -25.582)
  line L208 (-516.6782, -25.582) -> (-516.2635, -26.7663)
  line L209 (-516.2635, -26.7663) -> (-516.2635, -28.726)
  line L210 (-516.2635, -28.726) -> (-516.6782, -29.9158)
  line L211 (-516.6782, -29.9158) -> (-517.0768, -30.7291)
  line L212 (-517.0768, -30.7291) -> (-517.9173, -31.537)
  line L213 (-517.9173, -31.537) -> (-518.7797, -31.9518)
  line L214 (-518.7797, -31.9518) -> (-520.4555, -31.9518)
  line L215 (-520.4555, -31.9518) -> (-521.3234, -31.537)
  line L216 (-521.3234, -31.537) -> (-522.1585, -30.7291)
  line L217 (-522.1585, -30.7291) -> (-522.5624, -29.9158)
  line L218 (-522.5624, -29.9158) -> (-522.9772, -28.726)
  line L219 (-522.9772, -28.726) -> (-522.9772, -26.7663)
  line L220 (-522.5241, -26.832) -> (-522.5241, -28.6659)
  line L221 (-522.5241, -28.6659) -> (-522.1529, -29.7521)
  line L222 (-522.1529, -29.7521) -> (-521.7819, -30.4617)
  line L223 (-521.7819, -30.4617) -> (-521.0449, -31.1713)
  line L224 (-521.0449, -31.1713) -> (-520.3463, -31.5151)
  line L225 (-520.3463, -31.5151) -> (-518.8944, -31.5151)
  line L226 (-518.8944, -31.5151) -> (-518.1902, -31.1713)
  line L227 (-518.1902, -31.1713) -> (-517.4588, -30.4617)
  line L228 (-517.4588, -30.4617) -> (-517.0822, -29.7521)
  line L229 (-517.0822, -29.7521) -> (-516.7165, -28.6659)
  line L230 (-516.7165, -28.6659) -> (-516.7165, -26.832)
  line L231 (-516.7165, -26.832) -> (-517.0822, -25.7456)
  line L232 (-517.0822, -25.7456) -> (-517.4588, -25.0361)
  line L233 (-517.4588, -25.0361) -> (-518.1902, -24.3265)
  line L234 (-518.1902, -24.3265) -> (-518.8944, -23.9827)
  line L235 (-518.8944, -23.9827) -> (-520.3463, -23.9827)
  line L236 (-520.3463, -23.9827) -> (-521.0449, -24.3265)
  line L237 (-521.0449, -24.3265) -> (-521.7819, -25.0361)
  line L238 (-521.7819, -25.0361) -> (-522.1529, -25.7456)
  line L239 (-522.1529, -25.7456) -> (-522.5241, -26.832)
  line L240 (-529.8929, -23.5569) -> (-525.2259, -23.5569)
  line L241 (-525.2259, -23.5569) -> (-525.2259, -31.8699)
  line L242 (-525.2259, -31.8699) -> (-525.6735, -31.8699)
  line L243 (-525.6735, -31.8699) -> (-525.6735, -23.9827)
  line L244 (-525.6735, -23.9827) -> (-529.8929, -23.9827)
  line L245 (-529.8929, -23.9827) -> (-529.8929, -23.5569)
  line L246 (-533.4625, -30.8056) -> (-533.337, -30.4235)
  line L247 (-533.337, -30.4235) -> (-533.0205, -30.1232)
  line L248 (-533.0205, -30.1232) -> (-532.6329, -29.9977)
  line L249 (-532.6329, -29.9977) -> (-532.2781, -29.9977)
  line L250 (-532.2781, -29.9977) -> (-531.8906, -30.1232)
  line L251 (-531.8906, -30.1232) -> (-531.5739, -30.4235)
  line L252 (-531.5739, -30.4235) -> (-531.4484, -30.8056)
  line L253 (-531.4484, -30.8056) -> (-531.4484, -31.1494)
  line L254 (-531.4484, -31.1494) -> (-531.5739, -31.5206)
  line L255 (-531.5739, -31.5206) -> (-531.8851, -31.8317)
  line L256 (-531.8851, -31.8317) -> (-532.2781, -31.9518)
  line L257 (-532.2781, -31.9518) -> (-532.6329, -31.9518)
  line L258 (-532.6329, -31.9518) -> (-533.0259, -31.8317)
  line L259 (-533.0259, -31.8317) -> (-533.337, -31.5206)
  line L260 (-533.337, -31.5206) -> (-533.4625, -31.1494)
  line L261 (-533.4625, -31.1494) -> (-533.4625, -30.8056)
  line L262 (-533.0095, -30.8656) -> (-533.0095, -31.084)
  line L263 (-533.0095, -31.084) -> (-532.9386, -31.2804)
  line L264 (-532.9386, -31.2804) -> (-532.7694, -31.4442)
  line L265 (-532.7694, -31.4442) -> (-532.5674, -31.5151)
  line L266 (-532.5674, -31.5151) -> (-532.3436, -31.5151)
  line L267 (-532.3436, -31.5151) -> (-532.1417, -31.4442)
  line L268 (-532.1417, -31.4442) -> (-531.9725, -31.2804)
  line L269 (-531.9725, -31.2804) -> (-531.896, -31.084)
  line L270 (-531.896, -31.084) -> (-531.896, -30.871)
  line L271 (-531.896, -30.871) -> (-531.9725, -30.6691)
  line L272 (-531.9725, -30.6691) -> (-532.1417, -30.5054)
  line L273 (-532.1417, -30.5054) -> (-532.3436, -30.4344)
  line L274 (-532.3436, -30.4344) -> (-532.5674, -30.4344)
  line L275 (-532.5674, -30.4344) -> (-532.7694, -30.5054)
  line L276 (-532.7694, -30.5054) -> (-532.9386, -30.6691)
  line L277 (-532.9386, -30.6691) -> (-533.0095, -30.8656)
  line L278 (-403.6046, -22.2059) -> (-394.3046, -16.8672)
  line L279 (-394.3046, -16.8672) -> (-385.0046, -22.2059)
  line L280 (-385.0046, -22.2059) -> (-385.0046, -32.8835)
  line L281 (-385.0046, -32.8835) -> (-394.3046, -38.2223)
  line L282 (-394.3046, -38.2223) -> (-403.6046, -32.8835)
  line L283 (-403.6046, -32.8835) -> (-403.6046, -22.2059)
  line L284 (-413.0822, -38.2183) -> (-403.8372, -32.8795)
  line L285 (-385.3472, -32.8795) -> (-376.1022, -38.2183)
  line L286 (-385.3472, -22.2099) -> (-375.9019, -16.7555)
  line L287 (-375.9019, -16.7555) -> (-366.7571, -22.0324)
  line L288 (-375.9019, -6.1055) -> (-375.9019, -16.7555)
  point P0 (-759.785, 2)
  dimension "d3" = 0
properties part number "X-box-coverplate-2mm" material "Aluminum 6061"
